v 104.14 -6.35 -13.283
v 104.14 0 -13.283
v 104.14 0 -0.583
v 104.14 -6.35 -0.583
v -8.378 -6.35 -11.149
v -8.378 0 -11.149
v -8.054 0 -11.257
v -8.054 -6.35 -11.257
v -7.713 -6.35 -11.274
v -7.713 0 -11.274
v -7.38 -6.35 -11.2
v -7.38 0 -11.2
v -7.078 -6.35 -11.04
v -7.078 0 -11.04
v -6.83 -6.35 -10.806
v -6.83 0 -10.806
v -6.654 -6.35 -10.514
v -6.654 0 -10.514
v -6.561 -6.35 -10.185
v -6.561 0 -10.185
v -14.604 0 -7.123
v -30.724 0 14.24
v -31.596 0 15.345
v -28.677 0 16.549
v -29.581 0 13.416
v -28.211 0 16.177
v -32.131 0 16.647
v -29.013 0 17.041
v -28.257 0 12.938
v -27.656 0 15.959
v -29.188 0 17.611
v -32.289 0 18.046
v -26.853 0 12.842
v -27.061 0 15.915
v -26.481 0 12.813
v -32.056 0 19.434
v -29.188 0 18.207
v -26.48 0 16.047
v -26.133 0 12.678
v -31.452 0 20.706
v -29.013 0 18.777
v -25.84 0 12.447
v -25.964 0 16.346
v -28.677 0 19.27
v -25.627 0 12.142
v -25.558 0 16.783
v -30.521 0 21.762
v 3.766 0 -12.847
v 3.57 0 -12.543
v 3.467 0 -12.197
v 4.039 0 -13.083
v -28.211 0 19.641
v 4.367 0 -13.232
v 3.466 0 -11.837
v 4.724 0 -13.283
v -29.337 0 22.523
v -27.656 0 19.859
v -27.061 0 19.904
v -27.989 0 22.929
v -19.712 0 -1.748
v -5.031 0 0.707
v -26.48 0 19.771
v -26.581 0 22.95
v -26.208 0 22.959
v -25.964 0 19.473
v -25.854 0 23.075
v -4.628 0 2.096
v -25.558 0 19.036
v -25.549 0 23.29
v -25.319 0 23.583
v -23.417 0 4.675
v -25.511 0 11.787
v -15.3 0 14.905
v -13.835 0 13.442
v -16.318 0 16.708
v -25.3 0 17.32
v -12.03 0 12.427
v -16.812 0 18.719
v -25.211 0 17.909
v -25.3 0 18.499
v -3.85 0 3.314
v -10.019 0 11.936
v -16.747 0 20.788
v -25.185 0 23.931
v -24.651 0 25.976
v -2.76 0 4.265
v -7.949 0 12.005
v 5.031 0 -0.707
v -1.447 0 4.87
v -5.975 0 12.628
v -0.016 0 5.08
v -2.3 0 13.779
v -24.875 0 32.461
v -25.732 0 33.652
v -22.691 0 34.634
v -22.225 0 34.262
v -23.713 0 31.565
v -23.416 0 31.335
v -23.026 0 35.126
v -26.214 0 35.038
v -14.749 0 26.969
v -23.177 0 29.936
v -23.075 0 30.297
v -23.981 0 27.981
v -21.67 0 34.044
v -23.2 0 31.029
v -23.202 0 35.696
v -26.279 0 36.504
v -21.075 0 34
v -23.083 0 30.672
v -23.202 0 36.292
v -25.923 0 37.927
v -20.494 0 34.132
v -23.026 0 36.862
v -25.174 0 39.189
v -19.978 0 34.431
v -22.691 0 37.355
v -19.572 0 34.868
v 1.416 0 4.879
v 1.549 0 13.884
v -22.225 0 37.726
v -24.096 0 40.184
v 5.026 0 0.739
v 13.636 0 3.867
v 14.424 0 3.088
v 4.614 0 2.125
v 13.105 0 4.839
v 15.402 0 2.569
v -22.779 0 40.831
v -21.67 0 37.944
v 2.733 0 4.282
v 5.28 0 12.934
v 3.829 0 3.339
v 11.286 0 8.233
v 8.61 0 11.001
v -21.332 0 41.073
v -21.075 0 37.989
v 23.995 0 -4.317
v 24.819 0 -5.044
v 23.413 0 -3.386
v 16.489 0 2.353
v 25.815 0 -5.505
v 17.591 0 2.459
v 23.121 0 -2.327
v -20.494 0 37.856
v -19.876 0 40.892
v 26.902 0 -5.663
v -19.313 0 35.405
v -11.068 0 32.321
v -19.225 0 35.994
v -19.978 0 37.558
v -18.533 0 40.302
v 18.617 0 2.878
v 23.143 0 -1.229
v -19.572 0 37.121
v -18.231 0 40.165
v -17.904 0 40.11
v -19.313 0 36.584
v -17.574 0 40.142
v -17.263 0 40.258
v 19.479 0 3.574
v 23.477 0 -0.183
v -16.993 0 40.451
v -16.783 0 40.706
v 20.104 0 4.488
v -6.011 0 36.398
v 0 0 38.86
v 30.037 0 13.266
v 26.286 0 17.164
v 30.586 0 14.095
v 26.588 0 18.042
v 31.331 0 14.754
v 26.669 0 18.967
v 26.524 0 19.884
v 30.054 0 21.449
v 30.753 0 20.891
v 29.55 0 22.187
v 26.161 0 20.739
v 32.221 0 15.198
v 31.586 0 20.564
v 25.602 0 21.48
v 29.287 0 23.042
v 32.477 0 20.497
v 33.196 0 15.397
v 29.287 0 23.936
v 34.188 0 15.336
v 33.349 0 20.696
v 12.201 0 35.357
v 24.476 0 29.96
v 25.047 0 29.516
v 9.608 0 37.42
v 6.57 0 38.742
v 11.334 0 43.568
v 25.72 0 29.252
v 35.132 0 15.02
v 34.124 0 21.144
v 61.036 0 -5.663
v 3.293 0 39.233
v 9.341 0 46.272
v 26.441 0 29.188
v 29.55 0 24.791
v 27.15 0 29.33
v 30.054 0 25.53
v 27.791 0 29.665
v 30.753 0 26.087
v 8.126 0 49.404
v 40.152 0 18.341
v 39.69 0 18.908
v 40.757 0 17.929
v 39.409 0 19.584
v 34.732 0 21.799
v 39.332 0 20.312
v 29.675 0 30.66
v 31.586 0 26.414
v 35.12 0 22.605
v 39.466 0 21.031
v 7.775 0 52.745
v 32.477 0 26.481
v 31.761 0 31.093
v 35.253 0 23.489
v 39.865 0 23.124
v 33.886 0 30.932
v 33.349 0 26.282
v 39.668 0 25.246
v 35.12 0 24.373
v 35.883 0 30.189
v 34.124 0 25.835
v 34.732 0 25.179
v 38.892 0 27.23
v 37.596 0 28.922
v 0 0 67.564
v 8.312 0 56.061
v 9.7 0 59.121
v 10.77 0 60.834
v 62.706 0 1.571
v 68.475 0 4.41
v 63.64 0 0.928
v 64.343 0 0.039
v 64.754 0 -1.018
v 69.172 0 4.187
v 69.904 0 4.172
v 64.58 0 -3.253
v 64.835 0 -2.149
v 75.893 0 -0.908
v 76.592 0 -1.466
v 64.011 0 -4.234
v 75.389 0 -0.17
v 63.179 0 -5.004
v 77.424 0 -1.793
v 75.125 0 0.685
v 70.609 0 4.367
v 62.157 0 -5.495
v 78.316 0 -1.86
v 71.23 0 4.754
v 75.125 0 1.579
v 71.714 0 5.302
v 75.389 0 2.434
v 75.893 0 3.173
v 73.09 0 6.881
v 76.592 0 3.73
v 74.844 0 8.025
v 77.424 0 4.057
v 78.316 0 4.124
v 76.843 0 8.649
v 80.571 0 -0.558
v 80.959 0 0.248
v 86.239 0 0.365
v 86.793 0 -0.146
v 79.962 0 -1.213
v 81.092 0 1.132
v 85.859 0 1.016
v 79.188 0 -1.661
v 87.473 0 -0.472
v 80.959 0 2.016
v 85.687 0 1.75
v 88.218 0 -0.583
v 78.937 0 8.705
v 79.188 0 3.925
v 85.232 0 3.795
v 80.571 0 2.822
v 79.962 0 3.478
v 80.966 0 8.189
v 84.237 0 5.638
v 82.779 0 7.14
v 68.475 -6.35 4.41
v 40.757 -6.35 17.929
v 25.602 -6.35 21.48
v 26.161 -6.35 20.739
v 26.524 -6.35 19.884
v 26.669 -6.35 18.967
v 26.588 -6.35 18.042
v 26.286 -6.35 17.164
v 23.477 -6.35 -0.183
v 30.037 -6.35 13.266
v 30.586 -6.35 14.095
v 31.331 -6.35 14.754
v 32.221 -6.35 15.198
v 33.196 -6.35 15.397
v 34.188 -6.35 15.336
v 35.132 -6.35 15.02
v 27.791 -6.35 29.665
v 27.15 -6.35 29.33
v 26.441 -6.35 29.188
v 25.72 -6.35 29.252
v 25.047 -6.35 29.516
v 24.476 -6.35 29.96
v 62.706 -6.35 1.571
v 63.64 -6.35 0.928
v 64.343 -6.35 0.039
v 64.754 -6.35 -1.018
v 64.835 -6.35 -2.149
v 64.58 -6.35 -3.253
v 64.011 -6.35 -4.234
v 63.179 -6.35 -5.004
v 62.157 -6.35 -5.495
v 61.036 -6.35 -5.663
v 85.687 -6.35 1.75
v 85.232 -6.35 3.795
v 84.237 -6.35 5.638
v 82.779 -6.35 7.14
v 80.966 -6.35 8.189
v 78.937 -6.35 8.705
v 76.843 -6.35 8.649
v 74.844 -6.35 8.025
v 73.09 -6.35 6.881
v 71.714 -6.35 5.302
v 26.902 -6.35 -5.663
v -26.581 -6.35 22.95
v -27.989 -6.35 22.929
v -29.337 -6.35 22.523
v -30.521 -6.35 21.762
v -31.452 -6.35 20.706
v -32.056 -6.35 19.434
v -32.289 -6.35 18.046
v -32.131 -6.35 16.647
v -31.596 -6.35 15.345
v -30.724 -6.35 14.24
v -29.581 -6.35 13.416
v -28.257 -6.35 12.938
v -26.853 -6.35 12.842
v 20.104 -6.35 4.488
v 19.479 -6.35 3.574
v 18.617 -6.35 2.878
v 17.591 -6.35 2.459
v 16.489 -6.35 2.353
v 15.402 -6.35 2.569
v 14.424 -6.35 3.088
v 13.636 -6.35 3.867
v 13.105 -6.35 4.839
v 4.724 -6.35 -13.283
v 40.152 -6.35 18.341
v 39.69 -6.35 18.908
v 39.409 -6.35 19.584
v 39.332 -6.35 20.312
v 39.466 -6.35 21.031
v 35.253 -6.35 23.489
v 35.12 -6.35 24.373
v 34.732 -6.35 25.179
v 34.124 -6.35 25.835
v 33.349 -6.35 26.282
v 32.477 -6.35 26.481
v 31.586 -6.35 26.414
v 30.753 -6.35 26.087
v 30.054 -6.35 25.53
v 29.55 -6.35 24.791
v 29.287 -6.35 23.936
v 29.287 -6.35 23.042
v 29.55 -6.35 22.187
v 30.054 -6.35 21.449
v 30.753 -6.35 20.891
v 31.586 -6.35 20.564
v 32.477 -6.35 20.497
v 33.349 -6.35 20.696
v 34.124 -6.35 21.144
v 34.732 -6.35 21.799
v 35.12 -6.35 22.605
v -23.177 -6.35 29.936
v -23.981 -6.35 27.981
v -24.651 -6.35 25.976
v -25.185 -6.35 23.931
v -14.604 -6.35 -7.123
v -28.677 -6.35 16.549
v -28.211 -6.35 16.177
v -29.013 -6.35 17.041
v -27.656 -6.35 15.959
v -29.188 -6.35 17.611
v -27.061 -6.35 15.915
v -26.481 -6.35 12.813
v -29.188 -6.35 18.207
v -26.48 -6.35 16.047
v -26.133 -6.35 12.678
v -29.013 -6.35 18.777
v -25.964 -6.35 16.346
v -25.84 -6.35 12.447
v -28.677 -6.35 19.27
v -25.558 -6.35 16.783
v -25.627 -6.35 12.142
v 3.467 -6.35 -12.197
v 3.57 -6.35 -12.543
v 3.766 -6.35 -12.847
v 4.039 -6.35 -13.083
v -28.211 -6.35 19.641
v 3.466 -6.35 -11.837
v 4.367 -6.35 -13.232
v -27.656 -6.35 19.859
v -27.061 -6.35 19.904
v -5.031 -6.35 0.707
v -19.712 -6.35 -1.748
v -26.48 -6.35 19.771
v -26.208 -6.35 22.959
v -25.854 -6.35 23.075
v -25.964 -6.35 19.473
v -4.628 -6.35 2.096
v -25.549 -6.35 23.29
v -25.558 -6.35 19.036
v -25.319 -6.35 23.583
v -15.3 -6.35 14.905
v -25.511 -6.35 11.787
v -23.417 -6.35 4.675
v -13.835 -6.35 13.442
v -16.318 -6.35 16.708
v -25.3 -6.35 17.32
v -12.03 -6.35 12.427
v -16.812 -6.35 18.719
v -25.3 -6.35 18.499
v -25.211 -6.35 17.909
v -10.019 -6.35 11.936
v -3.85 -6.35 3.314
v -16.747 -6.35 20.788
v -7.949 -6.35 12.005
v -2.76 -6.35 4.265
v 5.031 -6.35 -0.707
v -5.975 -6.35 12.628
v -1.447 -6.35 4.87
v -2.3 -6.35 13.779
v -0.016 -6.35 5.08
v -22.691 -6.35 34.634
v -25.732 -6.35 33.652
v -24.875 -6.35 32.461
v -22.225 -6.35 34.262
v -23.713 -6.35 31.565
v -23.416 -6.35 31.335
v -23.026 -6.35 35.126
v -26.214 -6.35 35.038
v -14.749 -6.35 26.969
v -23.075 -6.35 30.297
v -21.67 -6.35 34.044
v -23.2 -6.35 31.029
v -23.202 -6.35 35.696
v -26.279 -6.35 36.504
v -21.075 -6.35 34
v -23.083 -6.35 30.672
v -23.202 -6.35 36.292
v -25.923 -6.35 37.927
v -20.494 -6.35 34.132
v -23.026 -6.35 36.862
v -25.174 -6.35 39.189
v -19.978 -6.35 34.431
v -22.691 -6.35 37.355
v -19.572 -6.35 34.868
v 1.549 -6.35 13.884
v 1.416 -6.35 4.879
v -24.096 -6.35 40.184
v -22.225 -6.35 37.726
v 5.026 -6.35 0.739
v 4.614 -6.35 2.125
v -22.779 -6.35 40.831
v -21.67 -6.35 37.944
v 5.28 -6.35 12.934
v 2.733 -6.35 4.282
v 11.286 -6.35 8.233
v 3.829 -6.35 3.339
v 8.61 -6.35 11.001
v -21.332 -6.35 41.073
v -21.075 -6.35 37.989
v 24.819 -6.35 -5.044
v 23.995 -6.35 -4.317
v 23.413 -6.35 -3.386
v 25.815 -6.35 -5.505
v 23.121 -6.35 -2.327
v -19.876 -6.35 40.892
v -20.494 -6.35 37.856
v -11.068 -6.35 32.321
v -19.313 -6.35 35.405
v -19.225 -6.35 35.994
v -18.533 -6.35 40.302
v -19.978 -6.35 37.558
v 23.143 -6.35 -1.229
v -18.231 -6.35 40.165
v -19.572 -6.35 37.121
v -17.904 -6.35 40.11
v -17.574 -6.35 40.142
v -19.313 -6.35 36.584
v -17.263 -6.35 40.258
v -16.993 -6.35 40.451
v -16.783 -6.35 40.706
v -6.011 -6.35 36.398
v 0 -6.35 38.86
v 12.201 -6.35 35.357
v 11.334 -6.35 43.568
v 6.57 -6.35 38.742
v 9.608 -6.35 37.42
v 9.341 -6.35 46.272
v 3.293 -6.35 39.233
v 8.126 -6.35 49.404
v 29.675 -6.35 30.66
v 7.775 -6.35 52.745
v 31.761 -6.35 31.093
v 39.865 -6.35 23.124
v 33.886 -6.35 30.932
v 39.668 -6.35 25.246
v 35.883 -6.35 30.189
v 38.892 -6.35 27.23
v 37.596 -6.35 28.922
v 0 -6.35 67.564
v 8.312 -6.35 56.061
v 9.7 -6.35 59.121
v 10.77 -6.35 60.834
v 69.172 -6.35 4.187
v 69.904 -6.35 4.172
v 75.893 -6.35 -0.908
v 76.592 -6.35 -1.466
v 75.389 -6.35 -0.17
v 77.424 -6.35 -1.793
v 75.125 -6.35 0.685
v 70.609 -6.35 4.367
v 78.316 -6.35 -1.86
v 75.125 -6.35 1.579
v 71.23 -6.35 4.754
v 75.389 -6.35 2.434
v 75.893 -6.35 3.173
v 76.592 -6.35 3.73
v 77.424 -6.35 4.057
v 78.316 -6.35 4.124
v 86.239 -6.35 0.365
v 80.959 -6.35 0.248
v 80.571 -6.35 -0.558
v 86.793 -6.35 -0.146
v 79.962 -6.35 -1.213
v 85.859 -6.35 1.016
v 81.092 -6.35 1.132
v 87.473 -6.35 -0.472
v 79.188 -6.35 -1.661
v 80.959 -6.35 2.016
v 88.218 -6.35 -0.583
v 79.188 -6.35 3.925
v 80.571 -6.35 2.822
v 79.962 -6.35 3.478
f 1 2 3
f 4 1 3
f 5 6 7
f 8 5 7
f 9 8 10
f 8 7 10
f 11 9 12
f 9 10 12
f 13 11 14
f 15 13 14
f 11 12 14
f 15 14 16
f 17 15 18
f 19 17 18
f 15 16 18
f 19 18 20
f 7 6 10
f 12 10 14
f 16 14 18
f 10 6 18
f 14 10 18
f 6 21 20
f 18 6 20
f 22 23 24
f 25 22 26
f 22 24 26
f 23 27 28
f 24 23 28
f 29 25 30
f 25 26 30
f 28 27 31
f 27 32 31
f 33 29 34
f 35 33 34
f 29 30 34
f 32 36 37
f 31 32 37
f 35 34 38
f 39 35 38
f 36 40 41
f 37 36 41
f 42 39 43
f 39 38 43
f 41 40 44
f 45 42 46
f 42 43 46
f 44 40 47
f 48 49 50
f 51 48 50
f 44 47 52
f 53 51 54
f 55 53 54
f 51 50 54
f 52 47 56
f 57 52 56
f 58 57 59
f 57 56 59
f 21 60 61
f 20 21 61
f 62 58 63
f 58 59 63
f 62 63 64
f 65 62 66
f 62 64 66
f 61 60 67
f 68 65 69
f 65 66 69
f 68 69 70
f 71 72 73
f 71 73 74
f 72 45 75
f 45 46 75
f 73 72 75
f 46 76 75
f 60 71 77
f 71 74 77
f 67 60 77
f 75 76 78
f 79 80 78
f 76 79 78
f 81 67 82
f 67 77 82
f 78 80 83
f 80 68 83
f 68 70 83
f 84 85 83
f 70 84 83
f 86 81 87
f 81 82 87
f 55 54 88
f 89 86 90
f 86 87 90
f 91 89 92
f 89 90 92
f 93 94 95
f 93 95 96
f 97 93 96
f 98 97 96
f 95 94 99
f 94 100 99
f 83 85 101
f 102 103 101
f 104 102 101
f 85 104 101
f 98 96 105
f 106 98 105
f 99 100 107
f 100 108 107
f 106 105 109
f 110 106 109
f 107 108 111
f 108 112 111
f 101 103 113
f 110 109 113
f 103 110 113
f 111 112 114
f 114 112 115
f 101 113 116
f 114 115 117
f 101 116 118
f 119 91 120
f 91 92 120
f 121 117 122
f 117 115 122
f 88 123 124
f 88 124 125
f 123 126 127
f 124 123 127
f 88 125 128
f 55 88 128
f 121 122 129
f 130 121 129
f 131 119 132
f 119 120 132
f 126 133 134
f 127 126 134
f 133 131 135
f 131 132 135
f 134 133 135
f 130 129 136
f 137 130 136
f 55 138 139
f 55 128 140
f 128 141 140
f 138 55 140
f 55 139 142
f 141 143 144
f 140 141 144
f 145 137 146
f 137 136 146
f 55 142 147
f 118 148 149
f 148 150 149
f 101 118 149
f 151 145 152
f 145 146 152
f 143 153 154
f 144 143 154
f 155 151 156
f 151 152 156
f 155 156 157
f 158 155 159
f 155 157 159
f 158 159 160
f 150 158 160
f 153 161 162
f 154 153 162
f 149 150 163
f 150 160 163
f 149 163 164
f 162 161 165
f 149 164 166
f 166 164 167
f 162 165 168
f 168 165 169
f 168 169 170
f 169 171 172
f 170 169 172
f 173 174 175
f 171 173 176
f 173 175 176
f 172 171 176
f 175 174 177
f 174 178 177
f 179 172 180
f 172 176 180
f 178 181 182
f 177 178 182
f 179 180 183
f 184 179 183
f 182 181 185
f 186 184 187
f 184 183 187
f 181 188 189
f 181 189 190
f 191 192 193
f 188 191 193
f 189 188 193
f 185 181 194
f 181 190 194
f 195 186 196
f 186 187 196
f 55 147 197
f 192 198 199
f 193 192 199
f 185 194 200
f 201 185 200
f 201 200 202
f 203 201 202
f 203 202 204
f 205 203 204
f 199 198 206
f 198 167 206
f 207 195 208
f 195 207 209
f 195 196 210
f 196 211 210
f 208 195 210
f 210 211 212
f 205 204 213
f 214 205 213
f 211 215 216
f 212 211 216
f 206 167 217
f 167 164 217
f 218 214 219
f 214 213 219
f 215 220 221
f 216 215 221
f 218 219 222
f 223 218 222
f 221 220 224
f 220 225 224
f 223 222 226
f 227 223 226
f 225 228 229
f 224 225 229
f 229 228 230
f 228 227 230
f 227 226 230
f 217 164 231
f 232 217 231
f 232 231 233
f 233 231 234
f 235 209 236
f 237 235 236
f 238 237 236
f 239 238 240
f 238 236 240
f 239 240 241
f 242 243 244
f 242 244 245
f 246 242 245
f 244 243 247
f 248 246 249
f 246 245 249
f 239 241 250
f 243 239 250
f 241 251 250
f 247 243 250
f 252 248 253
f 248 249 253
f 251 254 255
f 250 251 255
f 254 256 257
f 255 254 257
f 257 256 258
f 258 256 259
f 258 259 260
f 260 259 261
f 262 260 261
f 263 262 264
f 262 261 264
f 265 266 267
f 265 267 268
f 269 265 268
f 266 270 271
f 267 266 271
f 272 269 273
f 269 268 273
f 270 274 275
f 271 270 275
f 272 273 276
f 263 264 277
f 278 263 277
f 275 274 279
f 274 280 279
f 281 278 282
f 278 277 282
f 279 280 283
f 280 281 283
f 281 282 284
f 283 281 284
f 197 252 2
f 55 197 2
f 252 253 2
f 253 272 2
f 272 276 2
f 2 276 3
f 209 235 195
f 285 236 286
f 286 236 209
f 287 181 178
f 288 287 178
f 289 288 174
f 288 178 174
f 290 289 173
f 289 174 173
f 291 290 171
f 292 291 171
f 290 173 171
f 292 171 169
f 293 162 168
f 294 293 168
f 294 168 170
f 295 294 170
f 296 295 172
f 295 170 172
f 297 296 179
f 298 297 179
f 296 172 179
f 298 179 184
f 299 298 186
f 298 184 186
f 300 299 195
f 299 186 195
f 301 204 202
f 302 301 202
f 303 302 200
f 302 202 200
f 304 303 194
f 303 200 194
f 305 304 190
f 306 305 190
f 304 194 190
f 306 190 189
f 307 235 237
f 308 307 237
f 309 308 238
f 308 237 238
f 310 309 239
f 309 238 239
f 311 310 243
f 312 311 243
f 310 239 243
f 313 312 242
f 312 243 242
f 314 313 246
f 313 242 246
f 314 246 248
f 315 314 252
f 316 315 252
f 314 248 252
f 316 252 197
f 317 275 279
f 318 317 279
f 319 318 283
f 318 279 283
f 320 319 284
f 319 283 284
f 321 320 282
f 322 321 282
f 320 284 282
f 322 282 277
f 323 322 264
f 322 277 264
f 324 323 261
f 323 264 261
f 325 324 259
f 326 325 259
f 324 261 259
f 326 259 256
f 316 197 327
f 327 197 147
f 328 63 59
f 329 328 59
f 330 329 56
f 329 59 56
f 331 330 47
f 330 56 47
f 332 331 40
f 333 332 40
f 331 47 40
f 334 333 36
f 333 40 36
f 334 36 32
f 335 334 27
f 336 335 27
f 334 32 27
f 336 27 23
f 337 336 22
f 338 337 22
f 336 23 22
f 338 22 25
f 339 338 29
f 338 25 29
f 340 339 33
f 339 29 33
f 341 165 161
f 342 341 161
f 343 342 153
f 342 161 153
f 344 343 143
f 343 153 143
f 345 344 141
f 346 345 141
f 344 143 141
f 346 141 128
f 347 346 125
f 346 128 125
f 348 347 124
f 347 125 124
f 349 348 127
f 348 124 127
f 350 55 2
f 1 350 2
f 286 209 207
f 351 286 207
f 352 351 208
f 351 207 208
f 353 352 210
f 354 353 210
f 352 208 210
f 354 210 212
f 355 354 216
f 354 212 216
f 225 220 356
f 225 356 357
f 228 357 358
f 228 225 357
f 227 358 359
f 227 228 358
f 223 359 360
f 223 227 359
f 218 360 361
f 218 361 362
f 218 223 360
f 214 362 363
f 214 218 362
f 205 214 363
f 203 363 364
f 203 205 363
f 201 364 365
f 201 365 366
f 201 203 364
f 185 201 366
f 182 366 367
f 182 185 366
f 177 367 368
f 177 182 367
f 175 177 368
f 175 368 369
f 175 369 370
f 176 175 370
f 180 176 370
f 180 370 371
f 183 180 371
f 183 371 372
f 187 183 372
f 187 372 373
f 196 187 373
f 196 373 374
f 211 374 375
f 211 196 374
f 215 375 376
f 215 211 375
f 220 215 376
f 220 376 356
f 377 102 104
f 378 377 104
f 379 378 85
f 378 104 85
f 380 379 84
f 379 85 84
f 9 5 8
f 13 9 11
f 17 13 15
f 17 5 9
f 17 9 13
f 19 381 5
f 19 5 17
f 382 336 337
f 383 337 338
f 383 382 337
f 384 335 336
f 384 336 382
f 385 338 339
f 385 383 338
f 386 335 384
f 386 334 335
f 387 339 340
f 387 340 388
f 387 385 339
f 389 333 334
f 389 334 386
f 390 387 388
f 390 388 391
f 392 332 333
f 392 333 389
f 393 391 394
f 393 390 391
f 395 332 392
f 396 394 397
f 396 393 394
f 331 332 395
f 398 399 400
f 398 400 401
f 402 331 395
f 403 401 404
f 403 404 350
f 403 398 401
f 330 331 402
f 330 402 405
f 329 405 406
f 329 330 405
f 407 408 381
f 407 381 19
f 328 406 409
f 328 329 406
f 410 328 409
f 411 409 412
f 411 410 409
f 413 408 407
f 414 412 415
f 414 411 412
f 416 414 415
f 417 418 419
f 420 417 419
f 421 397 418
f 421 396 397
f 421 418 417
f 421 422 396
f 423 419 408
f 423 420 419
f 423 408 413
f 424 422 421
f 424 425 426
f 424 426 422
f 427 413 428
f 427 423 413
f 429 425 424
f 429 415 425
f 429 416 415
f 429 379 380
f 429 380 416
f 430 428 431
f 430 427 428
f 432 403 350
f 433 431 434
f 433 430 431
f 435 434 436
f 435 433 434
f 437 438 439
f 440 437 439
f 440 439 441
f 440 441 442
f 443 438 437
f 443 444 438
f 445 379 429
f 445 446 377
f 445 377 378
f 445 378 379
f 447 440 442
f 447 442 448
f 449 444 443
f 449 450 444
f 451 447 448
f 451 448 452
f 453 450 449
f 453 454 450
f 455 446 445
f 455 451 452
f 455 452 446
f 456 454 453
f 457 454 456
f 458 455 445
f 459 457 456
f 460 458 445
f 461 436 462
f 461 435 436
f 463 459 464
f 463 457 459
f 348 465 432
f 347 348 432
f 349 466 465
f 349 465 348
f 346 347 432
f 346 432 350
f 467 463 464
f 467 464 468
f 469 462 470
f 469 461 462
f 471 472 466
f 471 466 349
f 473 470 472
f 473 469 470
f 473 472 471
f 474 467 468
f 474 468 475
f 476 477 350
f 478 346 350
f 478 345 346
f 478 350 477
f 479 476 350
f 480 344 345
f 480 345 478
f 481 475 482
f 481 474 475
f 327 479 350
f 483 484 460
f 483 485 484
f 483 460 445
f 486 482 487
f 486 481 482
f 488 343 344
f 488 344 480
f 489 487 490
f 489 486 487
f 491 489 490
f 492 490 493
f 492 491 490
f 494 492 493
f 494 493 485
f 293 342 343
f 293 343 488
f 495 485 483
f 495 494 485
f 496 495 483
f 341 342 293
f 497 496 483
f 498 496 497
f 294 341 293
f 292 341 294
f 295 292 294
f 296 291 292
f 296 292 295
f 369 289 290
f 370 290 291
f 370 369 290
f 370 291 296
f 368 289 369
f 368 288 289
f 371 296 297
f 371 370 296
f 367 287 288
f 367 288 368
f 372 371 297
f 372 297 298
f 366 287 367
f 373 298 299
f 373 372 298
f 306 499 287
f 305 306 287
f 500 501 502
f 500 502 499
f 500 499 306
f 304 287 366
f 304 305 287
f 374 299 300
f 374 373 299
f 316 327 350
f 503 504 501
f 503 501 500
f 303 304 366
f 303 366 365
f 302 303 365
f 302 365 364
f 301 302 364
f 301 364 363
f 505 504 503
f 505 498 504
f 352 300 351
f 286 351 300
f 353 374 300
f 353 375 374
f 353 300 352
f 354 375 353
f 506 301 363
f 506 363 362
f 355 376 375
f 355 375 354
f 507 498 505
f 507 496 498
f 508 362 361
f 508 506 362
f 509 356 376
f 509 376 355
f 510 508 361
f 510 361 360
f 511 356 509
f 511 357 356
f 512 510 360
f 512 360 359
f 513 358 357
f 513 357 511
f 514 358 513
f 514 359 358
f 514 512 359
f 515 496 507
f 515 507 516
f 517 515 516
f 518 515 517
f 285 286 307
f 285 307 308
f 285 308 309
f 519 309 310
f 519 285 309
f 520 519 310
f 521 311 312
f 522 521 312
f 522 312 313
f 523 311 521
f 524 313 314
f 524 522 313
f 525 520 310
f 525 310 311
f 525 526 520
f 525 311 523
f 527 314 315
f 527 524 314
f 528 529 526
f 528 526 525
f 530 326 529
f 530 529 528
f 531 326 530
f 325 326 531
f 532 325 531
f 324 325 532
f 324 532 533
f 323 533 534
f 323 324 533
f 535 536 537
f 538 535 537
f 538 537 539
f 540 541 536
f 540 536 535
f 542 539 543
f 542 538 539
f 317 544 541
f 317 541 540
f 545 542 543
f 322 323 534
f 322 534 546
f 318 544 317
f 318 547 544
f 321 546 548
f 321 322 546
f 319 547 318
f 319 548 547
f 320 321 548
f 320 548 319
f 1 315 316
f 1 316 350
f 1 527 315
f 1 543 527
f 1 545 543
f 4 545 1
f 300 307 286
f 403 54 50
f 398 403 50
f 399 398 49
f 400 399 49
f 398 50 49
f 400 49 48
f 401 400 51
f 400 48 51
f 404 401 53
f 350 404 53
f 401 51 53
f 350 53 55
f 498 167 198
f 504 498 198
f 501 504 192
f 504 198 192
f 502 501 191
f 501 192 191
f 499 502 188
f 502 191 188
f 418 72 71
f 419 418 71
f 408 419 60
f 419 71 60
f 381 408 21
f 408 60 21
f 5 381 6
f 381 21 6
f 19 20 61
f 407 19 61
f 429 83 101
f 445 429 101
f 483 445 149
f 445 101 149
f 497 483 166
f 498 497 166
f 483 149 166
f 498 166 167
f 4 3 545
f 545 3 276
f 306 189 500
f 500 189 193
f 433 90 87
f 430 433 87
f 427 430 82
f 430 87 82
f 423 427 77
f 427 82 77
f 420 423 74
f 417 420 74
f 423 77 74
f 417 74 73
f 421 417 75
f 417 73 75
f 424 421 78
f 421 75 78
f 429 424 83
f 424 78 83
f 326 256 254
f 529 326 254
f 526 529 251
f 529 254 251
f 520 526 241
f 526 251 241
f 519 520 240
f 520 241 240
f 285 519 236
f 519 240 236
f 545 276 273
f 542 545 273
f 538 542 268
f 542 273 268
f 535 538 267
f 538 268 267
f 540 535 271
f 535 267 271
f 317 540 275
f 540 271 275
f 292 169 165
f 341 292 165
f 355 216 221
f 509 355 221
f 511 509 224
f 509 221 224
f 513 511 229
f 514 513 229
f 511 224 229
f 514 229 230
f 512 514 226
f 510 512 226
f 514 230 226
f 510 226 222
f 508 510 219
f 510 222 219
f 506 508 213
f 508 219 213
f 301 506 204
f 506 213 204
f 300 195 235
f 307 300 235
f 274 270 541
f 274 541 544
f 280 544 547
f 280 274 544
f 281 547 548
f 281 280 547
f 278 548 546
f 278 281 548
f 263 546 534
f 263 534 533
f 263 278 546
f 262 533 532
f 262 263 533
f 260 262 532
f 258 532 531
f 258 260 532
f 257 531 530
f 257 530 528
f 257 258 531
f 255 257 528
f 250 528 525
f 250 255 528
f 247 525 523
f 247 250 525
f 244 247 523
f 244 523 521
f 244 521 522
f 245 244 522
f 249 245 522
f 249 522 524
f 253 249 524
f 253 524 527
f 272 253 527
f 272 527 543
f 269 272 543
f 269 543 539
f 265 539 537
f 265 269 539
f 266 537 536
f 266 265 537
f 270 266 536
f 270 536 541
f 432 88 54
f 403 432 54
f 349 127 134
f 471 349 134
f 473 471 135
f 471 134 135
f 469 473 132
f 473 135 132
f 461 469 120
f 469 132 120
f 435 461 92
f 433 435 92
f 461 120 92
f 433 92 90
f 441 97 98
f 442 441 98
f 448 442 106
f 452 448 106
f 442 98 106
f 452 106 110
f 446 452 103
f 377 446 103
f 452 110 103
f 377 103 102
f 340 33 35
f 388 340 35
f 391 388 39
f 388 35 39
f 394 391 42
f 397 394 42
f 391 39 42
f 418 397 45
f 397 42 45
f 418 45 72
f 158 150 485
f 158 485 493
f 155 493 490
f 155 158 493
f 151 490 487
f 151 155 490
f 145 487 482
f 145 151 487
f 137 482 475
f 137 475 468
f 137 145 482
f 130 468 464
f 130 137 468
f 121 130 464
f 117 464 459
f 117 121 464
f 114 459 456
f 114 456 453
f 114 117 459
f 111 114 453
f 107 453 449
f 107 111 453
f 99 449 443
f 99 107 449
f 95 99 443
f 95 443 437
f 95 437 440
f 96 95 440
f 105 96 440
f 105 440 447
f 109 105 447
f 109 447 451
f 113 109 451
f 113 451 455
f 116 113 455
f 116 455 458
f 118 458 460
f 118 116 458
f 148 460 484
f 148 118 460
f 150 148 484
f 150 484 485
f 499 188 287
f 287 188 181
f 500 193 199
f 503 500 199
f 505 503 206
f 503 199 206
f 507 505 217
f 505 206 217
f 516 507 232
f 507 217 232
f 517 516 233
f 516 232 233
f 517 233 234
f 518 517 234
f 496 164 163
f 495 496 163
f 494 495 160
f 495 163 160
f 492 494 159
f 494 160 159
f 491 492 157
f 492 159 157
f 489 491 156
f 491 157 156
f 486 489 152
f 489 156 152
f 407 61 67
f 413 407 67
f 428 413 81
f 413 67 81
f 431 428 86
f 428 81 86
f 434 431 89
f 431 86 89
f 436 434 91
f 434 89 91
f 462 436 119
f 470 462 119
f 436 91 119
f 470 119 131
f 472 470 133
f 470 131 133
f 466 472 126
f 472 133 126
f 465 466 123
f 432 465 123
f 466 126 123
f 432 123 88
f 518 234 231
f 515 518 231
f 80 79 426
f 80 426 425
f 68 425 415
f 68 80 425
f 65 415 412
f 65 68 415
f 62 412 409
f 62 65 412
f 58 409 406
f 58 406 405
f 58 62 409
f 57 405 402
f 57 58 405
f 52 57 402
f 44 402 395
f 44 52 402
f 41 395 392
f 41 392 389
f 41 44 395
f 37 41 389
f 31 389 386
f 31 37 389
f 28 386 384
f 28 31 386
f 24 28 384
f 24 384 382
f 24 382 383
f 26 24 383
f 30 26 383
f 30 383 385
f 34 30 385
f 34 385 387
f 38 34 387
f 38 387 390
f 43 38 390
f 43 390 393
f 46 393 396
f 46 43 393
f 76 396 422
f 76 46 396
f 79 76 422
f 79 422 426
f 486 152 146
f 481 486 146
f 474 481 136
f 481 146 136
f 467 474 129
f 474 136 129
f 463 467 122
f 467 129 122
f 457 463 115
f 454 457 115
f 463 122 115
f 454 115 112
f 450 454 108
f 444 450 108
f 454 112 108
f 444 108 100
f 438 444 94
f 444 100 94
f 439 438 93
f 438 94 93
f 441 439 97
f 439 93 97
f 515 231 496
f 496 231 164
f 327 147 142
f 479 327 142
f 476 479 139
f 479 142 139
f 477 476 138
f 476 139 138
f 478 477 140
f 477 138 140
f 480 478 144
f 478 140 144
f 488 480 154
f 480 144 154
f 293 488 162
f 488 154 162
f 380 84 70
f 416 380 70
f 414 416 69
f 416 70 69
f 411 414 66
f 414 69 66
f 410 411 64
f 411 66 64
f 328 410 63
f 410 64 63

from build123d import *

# Parameters (mm, degrees)
F0_R     = 2
F0_R_2   = 3
F1_DEPTH = 6.35


with BuildPart() as f1:
    # F0 (on Front) → F1 (new body)
    with BuildSketch(Plane.XZ):
        with BuildLine():
            Line((-6.561359, -10.185191), (-5.030562, 0.706999))
            ThreePointArc((-5.030562, 0.706999), (0.706999, 5.030562), (5.030562, -0.706999))
            Line((5.030562, -0.706999), (3.466391, -11.836654))
            ThreePointArc((3.466391, -11.836654), (3.76555, -12.846599), (4.724031, -13.283404))
            Line((4.724031, -13.283404), (104.14, -13.283404))
            Line((104.14, -13.283404), (104.14, -0.583404))
            Line((104.14, -0.583404), (88.218285, -0.583404))
            ThreePointArc((88.218285, -0.583404), (86.496651, 0.089091), (85.686662, 1.750474))
            ThreePointArc((85.686662, 1.750474), (79.969162, 8.51722), (71.714249, 5.302397))
            ThreePointArc((71.714249, 5.302397), (70.263325, 4.243804), (68.474938, 4.409556))
            Line((68.474938, 4.409556), (40.756691, 17.928649))
            ThreePointArc((40.756691, 17.928649), (39.525036, 19.235869), (39.46594, 21.030948))
            ThreePointArc((39.46594, 21.030948), (36.784215, 29.615632), (27.790551, 29.665466))
            ThreePointArc((27.790551, 29.665466), (26.078277, 29.194234), (24.475846, 29.959843))
            Line((24.475846, 29.959843), (11.334145, 43.568473))
            ThreePointArc((11.334145, 43.568473), (7.839332, 51.063123), (9.69955, 59.120609))
            Line((9.69955, 59.120609), (10.770211, 60.834025))
            Line((10.770211, 60.834025), (0, 67.564))
            Line((0, 67.564), (-16.782521, 40.706351))
            ThreePointArc((-16.782521, 40.706351), (-17.573855, 40.141899), (-18.53254, 40.302328))
            ThreePointArc((-18.53254, 40.302328), (-25.594222, 38.585033), (-23.71271, 31.56532))
            ThreePointArc((-23.71271, 31.56532), (-23.128272, 30.854697), (-23.177073, 29.935909))
            ThreePointArc((-23.177073, 29.935909), (-24.332809, 26.984273), (-25.184893, 23.931106))
            ThreePointArc((-25.184893, 23.931106), (-25.693727, 23.17112), (-26.581209, 22.950068))
            ThreePointArc((-26.581209, 22.950068), (-32.288901, 18.045609), (-26.852685, 12.841859))
            ThreePointArc((-26.852685, 12.841859), (-25.978347, 12.57349), (-25.511038, 11.787288))
            ThreePointArc((-25.511038, 11.787288), (-19.712251, -1.748383), (-8.377773, -11.148912))
            ThreePointArc((-8.377773, -11.148912), (-7.223774, -11.130317), (-6.561359, -10.185191))
        make_face()
        with Locations((-27.210732, 17.909225)):
            Circle(F0_R, mode=Mode.SUBTRACT)
        with BuildLine():
            ThreePointArc((-5.974766, 12.627869), (-13.83499, 13.441854), (-16.746761, 20.788097))
            ThreePointArc((-16.746761, 20.788097), (-11.06787, 32.320826), (0, 38.859624))
            ThreePointArc((0, 38.859624), (6.56969, 38.742325), (12.20146, 35.357395))
            Line((12.20146, 35.357395), (25.602229, 21.480493))
            ThreePointArc((25.602229, 21.480493), (26.624637, 19.42986), (26.285949, 17.16365))
            Line((26.285949, 17.16365), (20.103772, 4.488308))
            ThreePointArc((20.103772, 4.488308), (16.488785, 2.353271), (13.105216, 4.838823))
            ThreePointArc((13.105216, 4.838823), (5.279976, 12.933784), (-5.974766, 12.627869))
        make_face(mode=Mode.SUBTRACT)
        with Locations((32.253298, 23.489035)):
            Circle(F0_R_2, mode=Mode.SUBTRACT)
        with BuildLine():
            ThreePointArc((30.036949, 13.265985), (32.220939, 15.198217), (35.131548, 15.020196))
            Line((35.131548, 15.020196), (62.706484, 1.571001))
            ThreePointArc((62.706484, 1.571001), (64.74864, -2.710467), (61.03629, -5.663404))
            Line((61.03629, -5.663404), (26.901744, -5.663404))
            ThreePointArc((26.901744, -5.663404), (23.67068, -3.872396), (23.477338, -0.18321))
            Line((23.477338, -0.18321), (30.036949, 13.265985))
        make_face(mode=Mode.SUBTRACT)
        with Locations((78.091794, 1.132107)):
            Circle(F0_R_2, mode=Mode.SUBTRACT)
        with Locations((-21.22453, 35.994243)):
            Circle(F0_R, mode=Mode.SUBTRACT)
    extrude(amount=F1_DEPTH)


solid = f1.part
